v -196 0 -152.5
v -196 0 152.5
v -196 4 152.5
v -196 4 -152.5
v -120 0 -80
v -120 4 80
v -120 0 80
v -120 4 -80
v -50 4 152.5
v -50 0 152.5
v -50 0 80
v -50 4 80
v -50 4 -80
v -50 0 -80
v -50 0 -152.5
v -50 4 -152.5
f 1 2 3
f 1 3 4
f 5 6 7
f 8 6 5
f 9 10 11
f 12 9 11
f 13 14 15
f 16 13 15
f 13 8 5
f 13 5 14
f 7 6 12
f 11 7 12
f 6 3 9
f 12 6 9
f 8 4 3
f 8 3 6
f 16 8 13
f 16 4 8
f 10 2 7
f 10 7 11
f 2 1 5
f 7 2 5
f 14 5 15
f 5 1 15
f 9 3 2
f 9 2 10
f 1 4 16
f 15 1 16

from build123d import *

# Parameters (mm, degrees)
CROQUIS1_W              = 146
CROQUIS1_H              = 310
SALIENTE_EXTRUIR1_DEPTH = 4
CROQUIS2_W              = 146
CROQUIS2_H              = 2.5
CORTAR_EXTRUIR1_DEPTH   = 10
CROQUIS3_W              = 70
CROQUIS3_H              = 160
CORTAR_EXTRUIR2_DEPTH   = 10


with BuildPart() as part:
    # Croquis1 → Saliente-Extruir1 (new body)
    with BuildSketch(Plane(origin=(0, 0, 0), x_dir=(1, 0, 0), z_dir=(0, 1, 0))):
        with Locations((-123, 0)):
            Rectangle(CROQUIS1_W, CROQUIS1_H)
    extrude(amount=SALIENTE_EXTRUIR1_DEPTH)

    # Croquis2 → Cortar-Extruir1 (cut)
    with BuildSketch(Plane(origin=(0, 4, 0), x_dir=(1, 0, 0), z_dir=(0, 1, 0))):
        with Locations((-123, 153.75)):
            Rectangle(CROQUIS2_W, CROQUIS2_H)
        with Locations((-123, -153.75)):
            Rectangle(CROQUIS2_W, CROQUIS2_H)
    extrude(amount=-CORTAR_EXTRUIR1_DEPTH, mode=Mode.SUBTRACT)

    # Croquis3 → Cortar-Extruir2 (cut)
    with BuildSketch(Plane(origin=(0, 4, 0), x_dir=(1, 0, 0), z_dir=(0, 1, 0))):
        with Locations((-85, 0)):
            Rectangle(CROQUIS3_W, CROQUIS3_H)
    extrude(amount=-CORTAR_EXTRUIR2_DEPTH, mode=Mode.SUBTRACT)


solid = part.part
